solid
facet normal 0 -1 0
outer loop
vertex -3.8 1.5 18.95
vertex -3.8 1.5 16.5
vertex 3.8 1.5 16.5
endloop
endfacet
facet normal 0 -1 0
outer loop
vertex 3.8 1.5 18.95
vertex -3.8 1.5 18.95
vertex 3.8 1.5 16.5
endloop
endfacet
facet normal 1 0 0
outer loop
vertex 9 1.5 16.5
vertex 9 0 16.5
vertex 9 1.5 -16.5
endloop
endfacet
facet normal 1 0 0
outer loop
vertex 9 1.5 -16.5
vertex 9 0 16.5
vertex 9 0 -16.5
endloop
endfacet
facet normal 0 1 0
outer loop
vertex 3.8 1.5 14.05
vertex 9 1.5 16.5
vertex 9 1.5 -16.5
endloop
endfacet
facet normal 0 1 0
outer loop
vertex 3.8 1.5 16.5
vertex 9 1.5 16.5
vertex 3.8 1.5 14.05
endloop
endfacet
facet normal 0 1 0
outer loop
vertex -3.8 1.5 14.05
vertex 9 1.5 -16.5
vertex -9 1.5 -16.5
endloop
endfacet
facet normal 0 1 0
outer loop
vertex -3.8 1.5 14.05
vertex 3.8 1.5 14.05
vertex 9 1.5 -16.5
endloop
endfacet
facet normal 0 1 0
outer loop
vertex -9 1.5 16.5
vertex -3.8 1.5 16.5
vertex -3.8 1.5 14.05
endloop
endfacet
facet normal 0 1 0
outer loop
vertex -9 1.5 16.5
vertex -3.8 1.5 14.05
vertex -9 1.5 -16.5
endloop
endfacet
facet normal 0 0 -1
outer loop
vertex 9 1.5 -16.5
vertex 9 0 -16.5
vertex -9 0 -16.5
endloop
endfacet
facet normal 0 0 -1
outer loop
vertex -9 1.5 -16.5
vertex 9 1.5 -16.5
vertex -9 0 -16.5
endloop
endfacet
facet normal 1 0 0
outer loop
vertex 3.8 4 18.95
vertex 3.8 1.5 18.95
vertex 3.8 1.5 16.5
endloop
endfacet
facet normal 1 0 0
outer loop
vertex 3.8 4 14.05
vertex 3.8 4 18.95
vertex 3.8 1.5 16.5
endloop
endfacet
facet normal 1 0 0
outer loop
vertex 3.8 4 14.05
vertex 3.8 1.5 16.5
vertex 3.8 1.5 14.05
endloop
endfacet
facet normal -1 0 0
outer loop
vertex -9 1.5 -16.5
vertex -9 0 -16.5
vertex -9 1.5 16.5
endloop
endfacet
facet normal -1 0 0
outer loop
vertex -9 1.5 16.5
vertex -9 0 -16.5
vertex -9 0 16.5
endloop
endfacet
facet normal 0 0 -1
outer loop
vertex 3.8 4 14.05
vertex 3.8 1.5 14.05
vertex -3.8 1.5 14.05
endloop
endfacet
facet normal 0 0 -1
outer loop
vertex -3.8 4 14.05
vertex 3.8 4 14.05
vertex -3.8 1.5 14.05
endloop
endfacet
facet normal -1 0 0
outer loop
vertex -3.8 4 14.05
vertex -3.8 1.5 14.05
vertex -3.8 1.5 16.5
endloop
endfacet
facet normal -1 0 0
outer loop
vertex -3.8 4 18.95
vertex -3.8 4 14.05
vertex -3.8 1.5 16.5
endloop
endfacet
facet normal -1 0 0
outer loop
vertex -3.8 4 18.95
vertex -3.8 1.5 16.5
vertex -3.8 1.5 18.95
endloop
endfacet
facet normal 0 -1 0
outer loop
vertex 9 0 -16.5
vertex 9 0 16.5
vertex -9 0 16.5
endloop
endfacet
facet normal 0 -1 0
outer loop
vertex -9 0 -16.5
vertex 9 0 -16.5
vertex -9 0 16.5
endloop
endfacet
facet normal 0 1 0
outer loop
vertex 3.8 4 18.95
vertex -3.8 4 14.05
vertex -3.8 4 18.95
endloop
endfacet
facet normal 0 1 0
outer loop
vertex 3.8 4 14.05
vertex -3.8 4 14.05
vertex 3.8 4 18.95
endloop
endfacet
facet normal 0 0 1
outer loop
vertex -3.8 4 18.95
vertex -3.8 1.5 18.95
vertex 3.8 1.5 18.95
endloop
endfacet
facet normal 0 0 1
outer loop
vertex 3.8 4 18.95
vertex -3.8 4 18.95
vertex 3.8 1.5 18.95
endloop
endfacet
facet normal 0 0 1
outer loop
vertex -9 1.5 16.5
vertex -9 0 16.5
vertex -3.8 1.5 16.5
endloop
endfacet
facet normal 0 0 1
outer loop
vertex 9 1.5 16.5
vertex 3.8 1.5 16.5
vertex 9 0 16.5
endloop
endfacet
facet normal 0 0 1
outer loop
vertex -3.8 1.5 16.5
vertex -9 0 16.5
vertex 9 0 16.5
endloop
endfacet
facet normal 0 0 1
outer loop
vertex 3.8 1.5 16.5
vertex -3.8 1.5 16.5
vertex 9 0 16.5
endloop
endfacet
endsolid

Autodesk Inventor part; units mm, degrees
ref_plane "YZ Plane" through (0, 0, 0) normal (1, 0, 0) x (0, 1, 0)
ref_plane "XZ Plane" through (0, 0, 0) normal (0, 1, 0) x (-1, 0, 0)
ref_plane "XY Plane" through (0, 0, 0) normal (0, 0, 1) x (1, 0, 0)
sketch "Sketch1" plane through (0, 0, 0) normal (0, 1, 0) x (-1, 0, 0)
  line L0 (9, 16.5) -> (-9, 16.5)
  line L1 (-9, 16.5) -> (-9, -16.5)
  line L2 (-9, -16.5) -> (9, -16.5)
  line L3 (9, -16.5) -> (9, 16.5)
  line L4 (9, 16.5) -> (-9, -16.5) construction
  line L5 (-9, 16.5) -> (9, -16.5) construction
  point P0 (0, 0)
  dimension "d0" = 18
  dimension "d1" = 33
extrude "Extrusion1" add sketch "Sketch1" along normal blind 1.5
sketch "Sketch2" plane through (0, 1.5, 0) normal (0, 1, 0) x (1, 0, 0)
  line L0 (-3.8, -18.95) -> (3.8, -18.95)
  line L1 (3.8, -18.95) -> (3.8, -14.05)
  line L2 (3.8, -14.05) -> (-3.8, -14.05)
  line L3 (-3.8, -14.05) -> (-3.8, -18.95)
  line L4 (-9, -16.5) -> (9, -16.5) projected
  line L5 (-3.8, -18.95) -> (3.8, -14.05) construction
  line L6 (3.8, -18.95) -> (-3.8, -14.05) construction
  point P0 (0, 0)
  point P1 (0, -16.5)
  dimension "d4" = 7.6
  dimension "d5" = 4.9
extrude "Extrusion2" add sketch "Sketch2" along normal blind 2.5
properties part number "microplaceholder" material "Aluminum 6061"
